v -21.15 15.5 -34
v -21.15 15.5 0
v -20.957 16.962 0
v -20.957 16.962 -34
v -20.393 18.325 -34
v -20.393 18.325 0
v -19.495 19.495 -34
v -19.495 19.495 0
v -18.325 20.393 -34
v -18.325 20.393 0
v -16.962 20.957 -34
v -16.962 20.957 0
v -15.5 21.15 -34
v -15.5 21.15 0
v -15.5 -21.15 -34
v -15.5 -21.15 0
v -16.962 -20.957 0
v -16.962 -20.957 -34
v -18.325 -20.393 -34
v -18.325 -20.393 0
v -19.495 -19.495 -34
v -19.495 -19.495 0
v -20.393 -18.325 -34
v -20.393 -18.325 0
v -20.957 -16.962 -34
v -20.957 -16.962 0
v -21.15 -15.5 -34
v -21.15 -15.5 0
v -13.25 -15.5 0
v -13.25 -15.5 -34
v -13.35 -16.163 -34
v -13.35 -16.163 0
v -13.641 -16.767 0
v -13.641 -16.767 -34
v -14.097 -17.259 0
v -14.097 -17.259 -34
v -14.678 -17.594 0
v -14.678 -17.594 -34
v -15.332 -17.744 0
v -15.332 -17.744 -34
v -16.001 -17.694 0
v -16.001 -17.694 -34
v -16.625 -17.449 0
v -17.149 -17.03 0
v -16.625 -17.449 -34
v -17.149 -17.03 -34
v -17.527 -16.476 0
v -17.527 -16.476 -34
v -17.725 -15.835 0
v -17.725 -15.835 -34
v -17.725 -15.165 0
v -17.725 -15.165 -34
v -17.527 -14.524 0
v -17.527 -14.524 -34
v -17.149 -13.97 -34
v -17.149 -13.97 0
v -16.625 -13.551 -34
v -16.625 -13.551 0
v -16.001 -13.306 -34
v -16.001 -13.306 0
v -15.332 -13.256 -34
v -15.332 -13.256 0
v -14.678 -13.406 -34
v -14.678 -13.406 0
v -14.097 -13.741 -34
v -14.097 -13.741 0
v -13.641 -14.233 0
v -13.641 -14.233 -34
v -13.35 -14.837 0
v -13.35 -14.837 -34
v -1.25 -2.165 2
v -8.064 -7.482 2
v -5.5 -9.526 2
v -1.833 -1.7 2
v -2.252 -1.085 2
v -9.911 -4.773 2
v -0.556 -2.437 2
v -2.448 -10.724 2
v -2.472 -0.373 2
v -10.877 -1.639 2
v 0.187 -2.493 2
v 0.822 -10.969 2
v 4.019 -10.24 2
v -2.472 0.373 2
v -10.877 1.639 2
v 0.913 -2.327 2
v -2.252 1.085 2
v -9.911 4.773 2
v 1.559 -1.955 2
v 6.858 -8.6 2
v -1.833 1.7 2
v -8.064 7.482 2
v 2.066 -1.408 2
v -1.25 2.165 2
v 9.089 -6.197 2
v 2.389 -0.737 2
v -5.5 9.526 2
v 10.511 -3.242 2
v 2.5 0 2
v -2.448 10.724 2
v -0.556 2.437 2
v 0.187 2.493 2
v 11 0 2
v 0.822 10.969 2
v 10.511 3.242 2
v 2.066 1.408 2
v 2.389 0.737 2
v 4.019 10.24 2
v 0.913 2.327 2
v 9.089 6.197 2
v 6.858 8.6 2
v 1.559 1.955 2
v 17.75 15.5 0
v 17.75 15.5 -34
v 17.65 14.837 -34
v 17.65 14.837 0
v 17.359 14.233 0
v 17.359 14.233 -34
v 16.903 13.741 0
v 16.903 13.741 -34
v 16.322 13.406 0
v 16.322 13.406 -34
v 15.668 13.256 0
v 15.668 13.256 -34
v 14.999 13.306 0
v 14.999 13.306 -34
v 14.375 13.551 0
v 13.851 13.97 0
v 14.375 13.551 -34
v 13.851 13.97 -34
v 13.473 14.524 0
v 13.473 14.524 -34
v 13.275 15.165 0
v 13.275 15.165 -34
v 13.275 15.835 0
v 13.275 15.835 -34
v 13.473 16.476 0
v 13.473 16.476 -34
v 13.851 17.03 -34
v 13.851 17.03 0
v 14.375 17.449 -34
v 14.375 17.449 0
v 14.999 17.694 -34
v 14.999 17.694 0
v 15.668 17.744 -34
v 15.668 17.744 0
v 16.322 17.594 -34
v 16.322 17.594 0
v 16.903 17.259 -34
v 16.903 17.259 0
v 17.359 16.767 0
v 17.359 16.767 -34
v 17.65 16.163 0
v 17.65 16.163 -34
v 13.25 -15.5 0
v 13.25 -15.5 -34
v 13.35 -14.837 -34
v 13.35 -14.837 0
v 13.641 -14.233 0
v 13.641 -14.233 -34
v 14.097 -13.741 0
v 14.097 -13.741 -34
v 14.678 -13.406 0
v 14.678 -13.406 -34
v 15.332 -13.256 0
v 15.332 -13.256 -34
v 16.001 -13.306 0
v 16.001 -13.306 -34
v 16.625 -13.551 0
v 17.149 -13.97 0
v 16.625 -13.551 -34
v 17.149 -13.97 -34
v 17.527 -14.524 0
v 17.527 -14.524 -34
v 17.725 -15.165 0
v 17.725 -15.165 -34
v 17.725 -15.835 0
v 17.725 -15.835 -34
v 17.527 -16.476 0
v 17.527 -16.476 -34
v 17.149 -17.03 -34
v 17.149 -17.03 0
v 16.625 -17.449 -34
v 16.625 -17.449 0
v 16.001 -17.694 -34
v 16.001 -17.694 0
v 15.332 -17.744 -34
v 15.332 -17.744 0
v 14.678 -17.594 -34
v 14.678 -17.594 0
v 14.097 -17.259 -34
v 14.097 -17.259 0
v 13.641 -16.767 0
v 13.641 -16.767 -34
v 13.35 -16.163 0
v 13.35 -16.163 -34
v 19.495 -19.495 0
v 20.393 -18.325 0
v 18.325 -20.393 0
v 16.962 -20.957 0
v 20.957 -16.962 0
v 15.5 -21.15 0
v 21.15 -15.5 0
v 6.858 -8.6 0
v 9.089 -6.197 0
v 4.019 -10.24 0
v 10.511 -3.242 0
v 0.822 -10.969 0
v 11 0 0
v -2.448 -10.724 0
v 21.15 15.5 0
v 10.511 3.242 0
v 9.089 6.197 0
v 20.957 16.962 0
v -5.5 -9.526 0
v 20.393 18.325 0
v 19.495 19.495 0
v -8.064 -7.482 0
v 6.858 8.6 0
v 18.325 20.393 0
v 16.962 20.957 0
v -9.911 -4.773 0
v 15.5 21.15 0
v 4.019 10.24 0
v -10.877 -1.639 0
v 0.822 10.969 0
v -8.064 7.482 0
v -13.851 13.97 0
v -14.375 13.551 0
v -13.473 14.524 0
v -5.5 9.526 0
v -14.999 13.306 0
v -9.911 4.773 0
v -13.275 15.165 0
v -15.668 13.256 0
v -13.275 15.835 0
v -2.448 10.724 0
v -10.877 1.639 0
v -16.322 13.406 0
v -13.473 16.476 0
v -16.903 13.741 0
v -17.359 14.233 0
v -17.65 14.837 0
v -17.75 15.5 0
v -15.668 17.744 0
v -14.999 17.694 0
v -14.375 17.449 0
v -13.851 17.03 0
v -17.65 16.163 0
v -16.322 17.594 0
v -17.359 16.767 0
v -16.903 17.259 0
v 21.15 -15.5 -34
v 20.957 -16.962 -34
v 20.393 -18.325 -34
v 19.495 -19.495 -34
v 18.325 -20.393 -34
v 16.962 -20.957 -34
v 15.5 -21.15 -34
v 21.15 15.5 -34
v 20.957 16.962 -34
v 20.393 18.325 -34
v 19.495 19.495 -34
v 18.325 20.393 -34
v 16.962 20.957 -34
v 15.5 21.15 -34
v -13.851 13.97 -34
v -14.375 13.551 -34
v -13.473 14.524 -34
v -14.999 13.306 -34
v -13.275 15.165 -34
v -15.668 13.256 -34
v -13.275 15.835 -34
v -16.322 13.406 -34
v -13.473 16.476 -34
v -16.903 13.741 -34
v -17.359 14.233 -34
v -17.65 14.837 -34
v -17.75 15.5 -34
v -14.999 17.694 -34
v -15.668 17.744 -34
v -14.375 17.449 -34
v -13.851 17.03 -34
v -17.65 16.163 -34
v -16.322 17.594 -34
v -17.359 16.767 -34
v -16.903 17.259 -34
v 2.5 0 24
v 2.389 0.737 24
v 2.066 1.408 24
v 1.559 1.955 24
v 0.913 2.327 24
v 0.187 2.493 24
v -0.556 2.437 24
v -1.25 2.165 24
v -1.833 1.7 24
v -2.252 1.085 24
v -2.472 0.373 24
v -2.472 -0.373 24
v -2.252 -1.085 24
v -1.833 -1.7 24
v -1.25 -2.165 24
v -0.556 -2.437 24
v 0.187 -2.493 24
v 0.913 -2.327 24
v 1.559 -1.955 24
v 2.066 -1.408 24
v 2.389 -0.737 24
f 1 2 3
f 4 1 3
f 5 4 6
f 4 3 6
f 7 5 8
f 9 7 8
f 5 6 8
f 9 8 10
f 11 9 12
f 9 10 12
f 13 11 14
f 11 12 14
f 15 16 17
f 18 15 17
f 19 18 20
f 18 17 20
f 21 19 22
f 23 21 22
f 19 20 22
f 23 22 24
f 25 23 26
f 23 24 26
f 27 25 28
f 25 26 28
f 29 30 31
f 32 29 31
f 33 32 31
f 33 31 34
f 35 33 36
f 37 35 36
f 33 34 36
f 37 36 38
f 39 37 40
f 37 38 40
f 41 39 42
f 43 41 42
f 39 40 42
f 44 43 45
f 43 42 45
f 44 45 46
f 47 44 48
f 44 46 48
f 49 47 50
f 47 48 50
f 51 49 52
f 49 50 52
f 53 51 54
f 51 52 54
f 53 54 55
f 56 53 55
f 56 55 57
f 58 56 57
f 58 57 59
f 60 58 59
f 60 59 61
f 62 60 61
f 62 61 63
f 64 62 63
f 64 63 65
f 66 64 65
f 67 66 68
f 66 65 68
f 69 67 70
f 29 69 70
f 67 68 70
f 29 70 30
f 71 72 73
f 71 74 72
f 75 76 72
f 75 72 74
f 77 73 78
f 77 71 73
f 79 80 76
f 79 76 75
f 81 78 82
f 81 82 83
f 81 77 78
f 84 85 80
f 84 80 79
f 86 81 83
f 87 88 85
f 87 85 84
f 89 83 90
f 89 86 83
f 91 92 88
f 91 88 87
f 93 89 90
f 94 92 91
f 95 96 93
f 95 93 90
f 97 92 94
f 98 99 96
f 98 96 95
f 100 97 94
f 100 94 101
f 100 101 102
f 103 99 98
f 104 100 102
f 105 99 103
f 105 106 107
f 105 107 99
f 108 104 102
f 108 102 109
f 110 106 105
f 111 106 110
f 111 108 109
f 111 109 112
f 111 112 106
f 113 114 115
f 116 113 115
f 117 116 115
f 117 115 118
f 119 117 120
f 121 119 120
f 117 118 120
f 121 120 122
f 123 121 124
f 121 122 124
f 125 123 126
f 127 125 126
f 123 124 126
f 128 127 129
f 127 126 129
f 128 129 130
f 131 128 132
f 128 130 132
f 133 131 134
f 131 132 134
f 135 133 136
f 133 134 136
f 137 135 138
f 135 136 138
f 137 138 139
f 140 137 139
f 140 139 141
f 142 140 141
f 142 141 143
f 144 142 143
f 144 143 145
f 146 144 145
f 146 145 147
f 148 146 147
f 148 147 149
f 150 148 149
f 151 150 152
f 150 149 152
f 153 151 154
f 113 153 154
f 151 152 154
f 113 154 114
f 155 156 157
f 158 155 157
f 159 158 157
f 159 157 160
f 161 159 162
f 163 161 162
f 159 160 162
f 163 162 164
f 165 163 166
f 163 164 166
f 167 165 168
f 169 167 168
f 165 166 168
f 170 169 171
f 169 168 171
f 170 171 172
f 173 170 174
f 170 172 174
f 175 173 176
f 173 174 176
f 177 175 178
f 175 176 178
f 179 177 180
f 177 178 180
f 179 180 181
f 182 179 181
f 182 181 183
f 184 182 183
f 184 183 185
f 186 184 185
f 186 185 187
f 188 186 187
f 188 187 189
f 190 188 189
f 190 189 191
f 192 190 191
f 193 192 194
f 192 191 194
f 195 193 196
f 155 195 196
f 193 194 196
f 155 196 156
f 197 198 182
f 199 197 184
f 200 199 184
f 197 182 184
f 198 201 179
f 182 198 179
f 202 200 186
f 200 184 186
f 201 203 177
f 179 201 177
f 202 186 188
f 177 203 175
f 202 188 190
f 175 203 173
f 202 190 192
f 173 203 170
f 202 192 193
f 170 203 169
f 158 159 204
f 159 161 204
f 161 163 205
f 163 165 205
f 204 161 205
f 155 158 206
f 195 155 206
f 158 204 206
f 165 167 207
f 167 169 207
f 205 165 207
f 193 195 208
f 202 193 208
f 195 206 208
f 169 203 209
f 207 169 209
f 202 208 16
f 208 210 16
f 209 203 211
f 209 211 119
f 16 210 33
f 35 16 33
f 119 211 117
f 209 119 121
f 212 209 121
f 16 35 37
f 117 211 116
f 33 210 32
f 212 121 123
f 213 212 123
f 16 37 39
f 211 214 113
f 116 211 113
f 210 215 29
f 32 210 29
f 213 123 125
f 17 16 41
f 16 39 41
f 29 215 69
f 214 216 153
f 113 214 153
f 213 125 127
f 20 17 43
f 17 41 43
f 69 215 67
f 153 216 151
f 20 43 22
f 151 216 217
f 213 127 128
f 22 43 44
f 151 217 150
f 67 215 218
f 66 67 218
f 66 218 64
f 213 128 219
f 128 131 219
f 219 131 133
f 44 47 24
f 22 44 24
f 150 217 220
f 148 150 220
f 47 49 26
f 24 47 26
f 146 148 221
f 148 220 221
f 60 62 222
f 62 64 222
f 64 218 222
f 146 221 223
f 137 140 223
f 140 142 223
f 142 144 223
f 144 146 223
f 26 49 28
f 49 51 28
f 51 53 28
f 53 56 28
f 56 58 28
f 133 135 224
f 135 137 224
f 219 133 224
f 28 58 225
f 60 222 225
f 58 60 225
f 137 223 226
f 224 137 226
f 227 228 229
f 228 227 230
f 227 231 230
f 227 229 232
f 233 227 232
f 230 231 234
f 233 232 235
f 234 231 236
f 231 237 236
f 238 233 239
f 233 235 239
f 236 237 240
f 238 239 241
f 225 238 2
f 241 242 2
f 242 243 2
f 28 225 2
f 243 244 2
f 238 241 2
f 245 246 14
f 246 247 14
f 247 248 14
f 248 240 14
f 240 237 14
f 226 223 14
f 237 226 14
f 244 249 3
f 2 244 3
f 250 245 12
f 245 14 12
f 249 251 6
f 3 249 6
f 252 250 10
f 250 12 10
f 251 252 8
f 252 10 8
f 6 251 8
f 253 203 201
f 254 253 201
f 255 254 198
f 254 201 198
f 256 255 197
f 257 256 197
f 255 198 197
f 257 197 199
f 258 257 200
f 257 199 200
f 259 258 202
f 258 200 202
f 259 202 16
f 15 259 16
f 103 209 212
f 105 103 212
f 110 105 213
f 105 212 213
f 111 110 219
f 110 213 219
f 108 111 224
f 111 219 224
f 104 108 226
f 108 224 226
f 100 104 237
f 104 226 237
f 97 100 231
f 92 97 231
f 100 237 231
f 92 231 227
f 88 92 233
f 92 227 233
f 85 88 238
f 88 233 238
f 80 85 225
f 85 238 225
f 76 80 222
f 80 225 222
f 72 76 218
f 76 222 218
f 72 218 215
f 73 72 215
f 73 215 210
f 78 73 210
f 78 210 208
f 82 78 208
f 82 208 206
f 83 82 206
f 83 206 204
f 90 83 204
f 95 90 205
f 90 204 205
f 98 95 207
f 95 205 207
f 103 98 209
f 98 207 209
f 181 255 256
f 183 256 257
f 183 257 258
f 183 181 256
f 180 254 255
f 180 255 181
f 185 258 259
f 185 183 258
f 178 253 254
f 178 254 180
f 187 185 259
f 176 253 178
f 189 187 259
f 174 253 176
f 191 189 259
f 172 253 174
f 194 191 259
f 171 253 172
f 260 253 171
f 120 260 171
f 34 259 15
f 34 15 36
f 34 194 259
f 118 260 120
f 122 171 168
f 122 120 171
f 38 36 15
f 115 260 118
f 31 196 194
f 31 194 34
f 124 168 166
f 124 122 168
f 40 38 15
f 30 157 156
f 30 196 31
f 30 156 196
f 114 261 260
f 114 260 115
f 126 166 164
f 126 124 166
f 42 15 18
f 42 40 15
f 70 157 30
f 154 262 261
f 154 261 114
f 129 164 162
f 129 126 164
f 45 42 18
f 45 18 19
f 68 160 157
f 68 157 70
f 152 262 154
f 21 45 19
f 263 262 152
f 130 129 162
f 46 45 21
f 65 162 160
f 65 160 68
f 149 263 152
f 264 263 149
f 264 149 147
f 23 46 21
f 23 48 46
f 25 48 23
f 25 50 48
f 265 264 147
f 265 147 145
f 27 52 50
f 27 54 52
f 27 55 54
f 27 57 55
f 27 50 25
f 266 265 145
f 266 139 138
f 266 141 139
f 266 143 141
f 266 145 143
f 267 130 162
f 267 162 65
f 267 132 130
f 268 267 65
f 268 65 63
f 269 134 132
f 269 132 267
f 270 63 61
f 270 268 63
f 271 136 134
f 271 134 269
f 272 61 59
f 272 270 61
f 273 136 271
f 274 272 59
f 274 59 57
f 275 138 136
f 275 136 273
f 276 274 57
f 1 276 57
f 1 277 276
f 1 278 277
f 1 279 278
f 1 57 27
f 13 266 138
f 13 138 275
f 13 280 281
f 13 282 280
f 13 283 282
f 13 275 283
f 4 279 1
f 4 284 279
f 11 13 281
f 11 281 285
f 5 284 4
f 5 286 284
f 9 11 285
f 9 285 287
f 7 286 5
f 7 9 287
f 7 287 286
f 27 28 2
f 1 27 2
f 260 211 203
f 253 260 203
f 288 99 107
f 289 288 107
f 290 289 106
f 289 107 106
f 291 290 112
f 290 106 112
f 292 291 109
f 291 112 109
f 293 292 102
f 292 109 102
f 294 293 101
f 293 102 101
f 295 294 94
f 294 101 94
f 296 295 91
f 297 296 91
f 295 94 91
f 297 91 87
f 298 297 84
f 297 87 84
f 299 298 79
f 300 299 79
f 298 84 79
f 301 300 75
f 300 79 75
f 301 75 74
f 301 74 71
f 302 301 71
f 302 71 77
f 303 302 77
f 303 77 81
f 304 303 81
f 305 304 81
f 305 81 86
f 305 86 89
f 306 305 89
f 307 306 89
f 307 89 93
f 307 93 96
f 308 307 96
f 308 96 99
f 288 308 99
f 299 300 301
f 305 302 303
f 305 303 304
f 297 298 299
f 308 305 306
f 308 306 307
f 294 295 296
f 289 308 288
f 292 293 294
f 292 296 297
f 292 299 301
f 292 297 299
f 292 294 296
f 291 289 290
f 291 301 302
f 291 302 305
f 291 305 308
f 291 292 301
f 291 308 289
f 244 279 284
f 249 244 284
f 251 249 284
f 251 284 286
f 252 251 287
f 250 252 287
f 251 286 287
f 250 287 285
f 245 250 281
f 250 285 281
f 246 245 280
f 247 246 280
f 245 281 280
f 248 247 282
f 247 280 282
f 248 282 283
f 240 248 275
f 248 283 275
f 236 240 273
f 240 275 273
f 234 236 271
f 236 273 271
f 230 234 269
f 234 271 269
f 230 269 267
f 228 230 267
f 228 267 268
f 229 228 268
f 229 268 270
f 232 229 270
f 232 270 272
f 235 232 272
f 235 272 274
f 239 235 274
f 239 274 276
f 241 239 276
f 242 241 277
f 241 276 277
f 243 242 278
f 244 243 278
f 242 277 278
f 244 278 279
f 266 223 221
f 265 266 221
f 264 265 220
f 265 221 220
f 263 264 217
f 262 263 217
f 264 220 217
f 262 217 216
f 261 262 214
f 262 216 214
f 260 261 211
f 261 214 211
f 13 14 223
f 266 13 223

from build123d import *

# Parameters (mm, degrees)
SKETCH1_R           = 2.5
BOSS_EXTRUDE1_DEPTH = 24
SKETCH2_R           = 11
BOSS_EXTRUDE2_DEPTH = 2
BOSS_EXTRUDE3_DEPTH = 34
SKETCH5_R           = 2.25
CUT_EXTRUDE1_DEPTH  = 34


with BuildPart() as part:
    # Sketch1 → Boss-Extrude1 (new body)
    with BuildSketch(Plane.XY):
        Circle(SKETCH1_R)
    extrude(amount=BOSS_EXTRUDE1_DEPTH)

    # Sketch2 → Boss-Extrude2 (add)
    with BuildSketch(Plane.XY):
        Circle(SKETCH2_R)
    extrude(amount=BOSS_EXTRUDE2_DEPTH)

    # Sketch4 → Boss-Extrude3 (add)
    with BuildSketch(Plane(origin=(0, 0, 0), x_dir=(-1, 0, 0), z_dir=(0, 0, -1))):
        with BuildLine():
            Line((15.5, 21.15), (-15.5, 21.15))
            ThreePointArc((-15.5, 21.15), (-19.495153314, 19.495153314), (-21.15, 15.5))
            Line((-21.15, 15.5), (-21.15, -15.5))
            ThreePointArc((-21.15, -15.5), (-19.495153314, -19.495153314), (-15.5, -21.15))
            Line((-15.5, -21.15), (15.5, -21.15))
            ThreePointArc((15.5, -21.15), (19.495153314, -19.495153314), (21.15, -15.5))
            Line((21.15, -15.5), (21.15, 15.5))
            ThreePointArc((21.15, 15.5), (19.495153314, 19.495153314), (15.5, 21.15))
        make_face()
    extrude(amount=BOSS_EXTRUDE3_DEPTH)

    # Sketch5 → Cut-Extrude1 (cut)
    with BuildSketch(Plane(origin=(0, 0, -34), x_dir=(-1, 0, 0), z_dir=(0, 0, -1))):
        with Locations((-15.5, -15.5)):
            Circle(SKETCH5_R)
        with Locations(Location((15.5, -15.5, 0), (0, 0, 180))):
            Circle(SKETCH5_R)
        with Locations(Location((-15.5, 15.5, 0), (0, 0, 180))):
            Circle(SKETCH5_R)
        with Locations((15.5, 15.5)):
            Circle(SKETCH5_R)
    extrude(amount=-CUT_EXTRUDE1_DEPTH, mode=Mode.SUBTRACT)


solid = part.part
